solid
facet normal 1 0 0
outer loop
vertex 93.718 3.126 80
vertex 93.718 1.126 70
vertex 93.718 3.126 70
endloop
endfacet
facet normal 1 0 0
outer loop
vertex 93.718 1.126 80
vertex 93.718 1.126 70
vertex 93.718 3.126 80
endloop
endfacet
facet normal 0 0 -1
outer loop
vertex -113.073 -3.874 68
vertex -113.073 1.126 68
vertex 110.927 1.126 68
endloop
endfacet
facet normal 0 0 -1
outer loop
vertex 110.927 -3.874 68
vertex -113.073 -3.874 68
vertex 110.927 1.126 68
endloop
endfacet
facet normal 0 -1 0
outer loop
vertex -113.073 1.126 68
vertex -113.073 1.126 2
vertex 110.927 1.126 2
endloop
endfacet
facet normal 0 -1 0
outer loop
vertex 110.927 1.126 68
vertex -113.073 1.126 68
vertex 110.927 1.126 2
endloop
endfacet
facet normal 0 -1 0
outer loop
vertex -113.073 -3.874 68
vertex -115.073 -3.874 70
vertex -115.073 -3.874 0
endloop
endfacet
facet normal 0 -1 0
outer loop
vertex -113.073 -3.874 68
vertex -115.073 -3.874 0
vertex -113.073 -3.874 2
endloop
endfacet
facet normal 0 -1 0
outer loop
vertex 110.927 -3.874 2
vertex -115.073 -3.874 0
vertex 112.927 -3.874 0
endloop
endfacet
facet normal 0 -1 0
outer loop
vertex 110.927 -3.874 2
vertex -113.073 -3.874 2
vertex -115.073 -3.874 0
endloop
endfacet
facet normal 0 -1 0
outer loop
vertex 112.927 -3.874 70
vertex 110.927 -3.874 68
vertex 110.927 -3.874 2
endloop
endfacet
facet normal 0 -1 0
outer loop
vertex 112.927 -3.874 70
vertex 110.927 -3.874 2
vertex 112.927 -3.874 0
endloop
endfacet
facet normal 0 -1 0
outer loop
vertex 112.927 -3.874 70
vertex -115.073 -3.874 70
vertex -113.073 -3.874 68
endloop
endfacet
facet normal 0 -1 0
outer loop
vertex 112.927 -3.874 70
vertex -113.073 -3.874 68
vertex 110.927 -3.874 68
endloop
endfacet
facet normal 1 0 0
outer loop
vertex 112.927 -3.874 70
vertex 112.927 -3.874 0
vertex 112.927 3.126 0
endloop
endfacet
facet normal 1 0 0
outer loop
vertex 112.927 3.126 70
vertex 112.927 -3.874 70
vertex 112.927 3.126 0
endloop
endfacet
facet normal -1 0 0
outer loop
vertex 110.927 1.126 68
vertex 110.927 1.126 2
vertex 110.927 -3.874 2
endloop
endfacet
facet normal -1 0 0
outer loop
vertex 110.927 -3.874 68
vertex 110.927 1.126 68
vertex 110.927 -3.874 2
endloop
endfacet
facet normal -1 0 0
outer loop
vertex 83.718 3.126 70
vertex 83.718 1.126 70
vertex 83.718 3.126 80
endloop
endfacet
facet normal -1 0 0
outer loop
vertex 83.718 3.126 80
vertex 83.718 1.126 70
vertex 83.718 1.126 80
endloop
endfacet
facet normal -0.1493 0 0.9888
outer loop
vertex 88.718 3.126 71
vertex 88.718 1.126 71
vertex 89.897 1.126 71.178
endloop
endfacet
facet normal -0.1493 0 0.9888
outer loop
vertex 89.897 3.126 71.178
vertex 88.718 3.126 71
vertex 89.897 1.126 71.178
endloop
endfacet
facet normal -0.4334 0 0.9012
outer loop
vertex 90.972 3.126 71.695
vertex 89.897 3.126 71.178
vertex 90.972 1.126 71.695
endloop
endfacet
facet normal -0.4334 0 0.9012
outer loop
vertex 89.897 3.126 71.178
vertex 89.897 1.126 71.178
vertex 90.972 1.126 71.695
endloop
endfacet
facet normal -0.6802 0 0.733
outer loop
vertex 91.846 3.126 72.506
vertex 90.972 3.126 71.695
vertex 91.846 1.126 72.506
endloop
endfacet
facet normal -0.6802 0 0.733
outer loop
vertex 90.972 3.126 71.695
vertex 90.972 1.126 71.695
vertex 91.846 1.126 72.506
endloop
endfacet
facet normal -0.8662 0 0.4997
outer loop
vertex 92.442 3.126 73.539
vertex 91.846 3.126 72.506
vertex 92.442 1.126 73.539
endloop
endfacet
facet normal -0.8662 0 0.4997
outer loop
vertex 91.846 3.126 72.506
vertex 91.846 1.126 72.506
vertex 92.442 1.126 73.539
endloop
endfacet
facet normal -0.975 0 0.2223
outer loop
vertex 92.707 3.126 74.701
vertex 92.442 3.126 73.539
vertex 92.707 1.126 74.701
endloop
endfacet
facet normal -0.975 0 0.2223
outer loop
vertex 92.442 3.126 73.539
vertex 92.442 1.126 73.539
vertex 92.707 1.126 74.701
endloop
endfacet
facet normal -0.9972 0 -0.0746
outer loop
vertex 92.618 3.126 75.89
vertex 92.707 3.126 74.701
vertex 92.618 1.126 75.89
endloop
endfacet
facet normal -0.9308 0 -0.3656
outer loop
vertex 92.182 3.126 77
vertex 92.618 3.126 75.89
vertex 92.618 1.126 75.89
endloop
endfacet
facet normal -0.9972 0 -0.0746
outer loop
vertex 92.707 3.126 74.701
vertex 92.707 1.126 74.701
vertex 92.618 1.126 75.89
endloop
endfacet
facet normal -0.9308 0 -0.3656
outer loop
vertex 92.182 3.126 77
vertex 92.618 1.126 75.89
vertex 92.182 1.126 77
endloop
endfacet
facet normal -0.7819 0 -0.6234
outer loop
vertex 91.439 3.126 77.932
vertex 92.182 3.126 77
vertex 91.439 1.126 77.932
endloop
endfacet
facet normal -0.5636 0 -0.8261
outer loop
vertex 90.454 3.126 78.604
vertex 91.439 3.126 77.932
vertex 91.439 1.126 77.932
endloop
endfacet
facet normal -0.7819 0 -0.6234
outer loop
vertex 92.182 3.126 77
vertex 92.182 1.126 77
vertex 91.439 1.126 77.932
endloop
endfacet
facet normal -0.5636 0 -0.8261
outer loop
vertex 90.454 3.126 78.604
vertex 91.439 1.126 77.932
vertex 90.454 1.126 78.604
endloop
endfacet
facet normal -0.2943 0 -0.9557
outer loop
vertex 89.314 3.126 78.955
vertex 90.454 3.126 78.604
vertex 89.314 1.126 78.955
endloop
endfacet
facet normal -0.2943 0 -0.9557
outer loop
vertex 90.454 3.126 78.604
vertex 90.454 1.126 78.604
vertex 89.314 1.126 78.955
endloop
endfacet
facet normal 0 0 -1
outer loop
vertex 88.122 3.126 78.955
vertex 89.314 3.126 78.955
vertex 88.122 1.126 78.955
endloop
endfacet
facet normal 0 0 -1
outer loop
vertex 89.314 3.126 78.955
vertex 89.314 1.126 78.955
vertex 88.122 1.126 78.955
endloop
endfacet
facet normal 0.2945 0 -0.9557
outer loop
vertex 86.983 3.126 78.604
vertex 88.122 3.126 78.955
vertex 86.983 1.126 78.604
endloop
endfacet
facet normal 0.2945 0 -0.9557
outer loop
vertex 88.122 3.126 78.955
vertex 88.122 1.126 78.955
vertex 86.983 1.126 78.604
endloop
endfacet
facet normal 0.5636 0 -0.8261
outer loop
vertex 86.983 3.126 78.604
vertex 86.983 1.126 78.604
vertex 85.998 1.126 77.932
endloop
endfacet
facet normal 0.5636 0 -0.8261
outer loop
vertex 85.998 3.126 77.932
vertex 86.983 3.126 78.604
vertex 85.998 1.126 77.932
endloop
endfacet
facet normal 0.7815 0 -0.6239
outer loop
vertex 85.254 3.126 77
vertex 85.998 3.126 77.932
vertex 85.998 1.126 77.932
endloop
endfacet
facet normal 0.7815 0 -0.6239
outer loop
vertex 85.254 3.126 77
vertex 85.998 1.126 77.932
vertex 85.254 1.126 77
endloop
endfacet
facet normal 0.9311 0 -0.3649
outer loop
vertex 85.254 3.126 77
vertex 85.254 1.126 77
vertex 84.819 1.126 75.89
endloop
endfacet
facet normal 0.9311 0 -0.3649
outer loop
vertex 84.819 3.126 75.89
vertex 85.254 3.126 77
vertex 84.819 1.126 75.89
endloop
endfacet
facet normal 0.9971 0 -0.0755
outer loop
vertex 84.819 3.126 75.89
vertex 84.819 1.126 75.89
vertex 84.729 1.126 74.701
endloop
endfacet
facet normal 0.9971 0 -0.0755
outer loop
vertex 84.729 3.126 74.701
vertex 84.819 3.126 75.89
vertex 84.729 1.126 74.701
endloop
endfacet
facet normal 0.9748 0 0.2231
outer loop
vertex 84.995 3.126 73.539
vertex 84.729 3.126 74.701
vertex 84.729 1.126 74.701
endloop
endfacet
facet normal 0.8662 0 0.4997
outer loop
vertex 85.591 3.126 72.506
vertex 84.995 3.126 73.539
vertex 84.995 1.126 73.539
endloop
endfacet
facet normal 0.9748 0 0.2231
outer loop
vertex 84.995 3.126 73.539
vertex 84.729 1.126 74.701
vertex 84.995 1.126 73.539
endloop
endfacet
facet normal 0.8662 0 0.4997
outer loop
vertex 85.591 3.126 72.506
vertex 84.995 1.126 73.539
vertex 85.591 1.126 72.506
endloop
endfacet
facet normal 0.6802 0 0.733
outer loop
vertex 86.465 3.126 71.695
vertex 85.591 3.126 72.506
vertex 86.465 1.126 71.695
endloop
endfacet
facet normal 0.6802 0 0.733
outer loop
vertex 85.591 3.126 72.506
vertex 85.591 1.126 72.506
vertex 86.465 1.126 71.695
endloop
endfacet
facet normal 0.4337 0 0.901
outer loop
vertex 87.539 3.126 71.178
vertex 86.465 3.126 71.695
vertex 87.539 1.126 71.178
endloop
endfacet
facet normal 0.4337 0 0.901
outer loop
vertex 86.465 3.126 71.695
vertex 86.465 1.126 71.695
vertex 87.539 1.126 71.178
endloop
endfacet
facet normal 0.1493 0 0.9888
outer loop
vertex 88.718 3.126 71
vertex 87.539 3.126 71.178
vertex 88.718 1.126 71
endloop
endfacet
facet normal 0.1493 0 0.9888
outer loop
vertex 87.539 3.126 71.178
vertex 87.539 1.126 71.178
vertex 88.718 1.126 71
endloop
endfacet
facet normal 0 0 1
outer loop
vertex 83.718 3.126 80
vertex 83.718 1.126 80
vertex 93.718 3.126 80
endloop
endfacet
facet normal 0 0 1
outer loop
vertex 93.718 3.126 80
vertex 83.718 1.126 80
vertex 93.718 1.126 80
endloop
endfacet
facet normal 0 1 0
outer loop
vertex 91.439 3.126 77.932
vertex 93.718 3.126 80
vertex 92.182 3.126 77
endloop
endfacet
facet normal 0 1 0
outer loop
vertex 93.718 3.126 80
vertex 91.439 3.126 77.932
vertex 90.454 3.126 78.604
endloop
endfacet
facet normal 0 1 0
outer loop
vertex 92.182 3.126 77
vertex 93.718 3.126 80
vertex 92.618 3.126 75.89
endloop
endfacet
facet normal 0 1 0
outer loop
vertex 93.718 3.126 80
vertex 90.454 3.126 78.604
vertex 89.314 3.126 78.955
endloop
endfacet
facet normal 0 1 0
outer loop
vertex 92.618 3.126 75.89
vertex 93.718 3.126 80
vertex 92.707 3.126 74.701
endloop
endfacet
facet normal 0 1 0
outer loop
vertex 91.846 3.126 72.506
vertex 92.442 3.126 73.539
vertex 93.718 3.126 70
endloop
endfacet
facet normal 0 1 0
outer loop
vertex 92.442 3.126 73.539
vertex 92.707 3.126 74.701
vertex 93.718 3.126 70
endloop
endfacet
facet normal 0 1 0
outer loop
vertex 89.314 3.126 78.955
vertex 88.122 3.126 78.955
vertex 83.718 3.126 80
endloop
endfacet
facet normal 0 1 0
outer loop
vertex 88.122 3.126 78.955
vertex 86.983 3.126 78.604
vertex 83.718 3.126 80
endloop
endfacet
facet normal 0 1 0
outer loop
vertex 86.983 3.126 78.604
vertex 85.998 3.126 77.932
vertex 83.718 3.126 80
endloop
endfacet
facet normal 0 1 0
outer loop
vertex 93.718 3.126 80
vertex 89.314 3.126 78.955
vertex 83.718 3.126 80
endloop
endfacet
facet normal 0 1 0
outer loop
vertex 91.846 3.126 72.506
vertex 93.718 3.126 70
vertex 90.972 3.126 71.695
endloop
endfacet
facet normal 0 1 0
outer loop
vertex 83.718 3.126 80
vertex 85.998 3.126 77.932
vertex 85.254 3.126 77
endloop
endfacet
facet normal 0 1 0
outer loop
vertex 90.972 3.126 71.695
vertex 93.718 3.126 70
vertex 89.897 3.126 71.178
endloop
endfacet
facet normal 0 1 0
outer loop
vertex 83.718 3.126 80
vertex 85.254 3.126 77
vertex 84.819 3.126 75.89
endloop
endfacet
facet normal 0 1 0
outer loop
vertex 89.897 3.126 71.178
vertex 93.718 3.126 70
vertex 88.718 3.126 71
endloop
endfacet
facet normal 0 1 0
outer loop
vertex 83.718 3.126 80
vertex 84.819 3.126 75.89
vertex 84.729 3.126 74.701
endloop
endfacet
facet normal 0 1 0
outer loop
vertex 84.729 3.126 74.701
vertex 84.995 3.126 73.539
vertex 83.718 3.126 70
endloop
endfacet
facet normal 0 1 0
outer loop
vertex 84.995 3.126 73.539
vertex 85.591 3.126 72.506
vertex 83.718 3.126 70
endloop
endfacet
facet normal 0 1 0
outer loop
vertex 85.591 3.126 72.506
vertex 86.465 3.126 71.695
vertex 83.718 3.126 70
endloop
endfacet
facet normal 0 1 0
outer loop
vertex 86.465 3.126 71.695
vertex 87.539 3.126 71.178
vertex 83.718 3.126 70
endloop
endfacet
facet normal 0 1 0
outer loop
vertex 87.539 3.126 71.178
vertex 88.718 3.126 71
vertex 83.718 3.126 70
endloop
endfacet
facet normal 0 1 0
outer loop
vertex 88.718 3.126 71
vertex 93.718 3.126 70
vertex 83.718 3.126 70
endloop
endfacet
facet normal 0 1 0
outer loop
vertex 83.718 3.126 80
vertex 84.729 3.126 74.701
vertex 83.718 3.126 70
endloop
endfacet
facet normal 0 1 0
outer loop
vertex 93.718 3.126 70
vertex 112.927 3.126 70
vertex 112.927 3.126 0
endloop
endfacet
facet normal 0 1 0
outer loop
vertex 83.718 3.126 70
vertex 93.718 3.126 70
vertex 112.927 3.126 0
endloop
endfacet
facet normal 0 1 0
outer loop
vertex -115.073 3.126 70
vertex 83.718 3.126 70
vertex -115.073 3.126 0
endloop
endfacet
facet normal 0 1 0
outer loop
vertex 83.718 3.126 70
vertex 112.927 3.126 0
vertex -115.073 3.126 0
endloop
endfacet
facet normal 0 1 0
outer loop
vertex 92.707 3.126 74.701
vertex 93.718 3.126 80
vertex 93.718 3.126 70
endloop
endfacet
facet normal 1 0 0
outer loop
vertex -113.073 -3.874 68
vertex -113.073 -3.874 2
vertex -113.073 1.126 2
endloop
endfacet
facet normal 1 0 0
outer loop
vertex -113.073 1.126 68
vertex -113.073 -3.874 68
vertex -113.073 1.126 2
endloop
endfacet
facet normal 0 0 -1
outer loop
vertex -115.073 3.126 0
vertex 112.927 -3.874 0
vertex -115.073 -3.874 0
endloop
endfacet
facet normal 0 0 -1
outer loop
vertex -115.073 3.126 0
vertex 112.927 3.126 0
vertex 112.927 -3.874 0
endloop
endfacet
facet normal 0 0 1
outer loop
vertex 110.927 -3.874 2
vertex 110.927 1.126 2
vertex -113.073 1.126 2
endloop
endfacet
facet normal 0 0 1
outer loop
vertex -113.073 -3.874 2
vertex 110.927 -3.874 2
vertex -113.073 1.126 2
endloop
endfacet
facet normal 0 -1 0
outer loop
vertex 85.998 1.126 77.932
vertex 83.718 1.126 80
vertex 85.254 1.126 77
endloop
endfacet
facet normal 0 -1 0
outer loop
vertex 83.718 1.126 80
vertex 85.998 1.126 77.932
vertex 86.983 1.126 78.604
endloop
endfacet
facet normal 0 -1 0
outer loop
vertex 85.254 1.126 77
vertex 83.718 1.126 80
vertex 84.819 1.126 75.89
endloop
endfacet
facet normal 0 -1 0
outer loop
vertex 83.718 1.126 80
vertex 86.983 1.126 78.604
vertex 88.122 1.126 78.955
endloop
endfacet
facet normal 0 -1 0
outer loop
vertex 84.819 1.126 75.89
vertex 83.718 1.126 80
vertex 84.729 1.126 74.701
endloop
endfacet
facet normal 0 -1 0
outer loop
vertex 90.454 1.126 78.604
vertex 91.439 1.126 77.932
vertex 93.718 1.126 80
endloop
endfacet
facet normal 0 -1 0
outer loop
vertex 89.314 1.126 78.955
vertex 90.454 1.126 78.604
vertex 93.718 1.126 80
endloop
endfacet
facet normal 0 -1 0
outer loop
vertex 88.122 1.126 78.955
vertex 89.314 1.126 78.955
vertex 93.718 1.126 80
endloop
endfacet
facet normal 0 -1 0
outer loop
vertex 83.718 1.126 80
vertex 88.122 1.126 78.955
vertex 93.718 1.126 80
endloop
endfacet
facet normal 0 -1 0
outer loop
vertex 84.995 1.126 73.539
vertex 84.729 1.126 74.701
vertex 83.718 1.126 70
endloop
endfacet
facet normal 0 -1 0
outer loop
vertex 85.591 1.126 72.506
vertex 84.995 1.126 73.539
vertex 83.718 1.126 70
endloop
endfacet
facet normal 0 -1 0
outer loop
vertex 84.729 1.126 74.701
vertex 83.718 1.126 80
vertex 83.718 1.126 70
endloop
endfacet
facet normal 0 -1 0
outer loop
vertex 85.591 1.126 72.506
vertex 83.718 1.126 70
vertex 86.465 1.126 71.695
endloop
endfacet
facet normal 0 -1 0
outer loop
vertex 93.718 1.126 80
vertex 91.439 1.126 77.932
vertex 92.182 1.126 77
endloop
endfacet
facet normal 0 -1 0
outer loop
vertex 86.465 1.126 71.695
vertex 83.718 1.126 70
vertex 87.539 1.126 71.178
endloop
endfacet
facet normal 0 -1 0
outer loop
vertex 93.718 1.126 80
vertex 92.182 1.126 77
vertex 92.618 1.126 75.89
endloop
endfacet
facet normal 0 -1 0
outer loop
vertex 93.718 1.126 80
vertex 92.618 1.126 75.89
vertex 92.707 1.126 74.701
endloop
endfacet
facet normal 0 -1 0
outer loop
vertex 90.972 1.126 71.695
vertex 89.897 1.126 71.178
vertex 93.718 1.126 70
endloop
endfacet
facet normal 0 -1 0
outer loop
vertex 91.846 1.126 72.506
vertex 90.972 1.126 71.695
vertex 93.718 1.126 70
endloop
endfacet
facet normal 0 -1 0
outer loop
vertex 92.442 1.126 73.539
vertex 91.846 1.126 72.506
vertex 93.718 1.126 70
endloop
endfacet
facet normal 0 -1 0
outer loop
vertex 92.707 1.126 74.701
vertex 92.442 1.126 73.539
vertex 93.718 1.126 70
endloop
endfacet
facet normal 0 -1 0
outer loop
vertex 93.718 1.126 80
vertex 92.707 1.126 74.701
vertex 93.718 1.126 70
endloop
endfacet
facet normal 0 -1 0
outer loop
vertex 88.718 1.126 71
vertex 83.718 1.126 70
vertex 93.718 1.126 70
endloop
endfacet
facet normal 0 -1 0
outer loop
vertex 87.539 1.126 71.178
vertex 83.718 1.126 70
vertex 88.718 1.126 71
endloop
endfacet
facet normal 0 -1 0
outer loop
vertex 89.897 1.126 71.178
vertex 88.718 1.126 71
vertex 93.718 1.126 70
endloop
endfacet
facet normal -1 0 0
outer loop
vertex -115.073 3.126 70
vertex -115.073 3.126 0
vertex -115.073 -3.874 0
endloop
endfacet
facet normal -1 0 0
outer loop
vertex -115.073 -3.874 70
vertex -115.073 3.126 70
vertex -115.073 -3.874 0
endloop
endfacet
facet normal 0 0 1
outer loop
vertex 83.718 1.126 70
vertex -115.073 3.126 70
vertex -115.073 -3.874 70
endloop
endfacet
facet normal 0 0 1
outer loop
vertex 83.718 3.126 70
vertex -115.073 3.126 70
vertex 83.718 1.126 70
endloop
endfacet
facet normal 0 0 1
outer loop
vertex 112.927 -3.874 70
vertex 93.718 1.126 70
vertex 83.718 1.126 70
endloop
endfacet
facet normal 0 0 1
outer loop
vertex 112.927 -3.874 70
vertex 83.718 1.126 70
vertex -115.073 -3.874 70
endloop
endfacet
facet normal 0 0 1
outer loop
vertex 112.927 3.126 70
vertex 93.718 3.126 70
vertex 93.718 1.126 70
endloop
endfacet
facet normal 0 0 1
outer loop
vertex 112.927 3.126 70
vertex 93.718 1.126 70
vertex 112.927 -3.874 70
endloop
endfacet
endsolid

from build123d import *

# Parameters (mm, degrees)
BOSS_EXTRU_1_DEPTH = 70
ESQUISSE3_W        = 224
ESQUISSE3_H        = 5
BOSS_EXTRU_2_DEPTH = 2
ESQUISSE5_W        = 10
ESQUISSE5_H        = 10
ESQUISSE5_R        = 4
BOSS_EXTRU_3_DEPTH = 2
ESQUISSE6_W        = 224
ESQUISSE6_H        = 5
BOSS_EXTRU_4_DEPTH = 2


with BuildPart() as part:
    # Esquisse1 → Boss.-Extru.1 (new body)
    with BuildSketch(Plane.XY):
        Polygon((-115.072635135, 3.126470588), (-115.072635135, -3.873529412), (-113.072635135, -3.873529412), (-113.072635135, 1.126470588), (110.927364865, 1.126470588), (110.927364865, -3.873529412), (112.927364865, -3.873529412), (112.927364865, 3.126470588), align=None)
    extrude(amount=BOSS_EXTRU_1_DEPTH)

    # Esquisse3 → Boss.-Extru.2 (add)
    with BuildSketch(Plane(origin=(0, 0, 0), x_dir=(-1, 0, 0), z_dir=(0, 0, -1))):
        with Locations((1.072635135, -1.373529412)):
            Rectangle(ESQUISSE3_W, ESQUISSE3_H)
    extrude(amount=-BOSS_EXTRU_2_DEPTH)

    # Esquisse5 → Boss.-Extru.3 (add, through all)
    with BuildSketch(Plane.XZ.offset(-1.126470588)):
        with Locations((88.718220762, 75)):
            Rectangle(ESQUISSE5_W, ESQUISSE5_H)
        with Locations(Location((88.718220762, 75, 0), (0, 0, 270))):
            Circle(ESQUISSE5_R, mode=Mode.SUBTRACT)
    extrude(amount=-BOSS_EXTRU_3_DEPTH)

    # Esquisse6 → Boss.-Extru.4 (add)
    with BuildSketch(Plane.XY.offset(70)):
        with Locations((-1.072635135, -1.373529412)):
            Rectangle(ESQUISSE6_W, ESQUISSE6_H)
    extrude(amount=-BOSS_EXTRU_4_DEPTH)


solid = part.part
